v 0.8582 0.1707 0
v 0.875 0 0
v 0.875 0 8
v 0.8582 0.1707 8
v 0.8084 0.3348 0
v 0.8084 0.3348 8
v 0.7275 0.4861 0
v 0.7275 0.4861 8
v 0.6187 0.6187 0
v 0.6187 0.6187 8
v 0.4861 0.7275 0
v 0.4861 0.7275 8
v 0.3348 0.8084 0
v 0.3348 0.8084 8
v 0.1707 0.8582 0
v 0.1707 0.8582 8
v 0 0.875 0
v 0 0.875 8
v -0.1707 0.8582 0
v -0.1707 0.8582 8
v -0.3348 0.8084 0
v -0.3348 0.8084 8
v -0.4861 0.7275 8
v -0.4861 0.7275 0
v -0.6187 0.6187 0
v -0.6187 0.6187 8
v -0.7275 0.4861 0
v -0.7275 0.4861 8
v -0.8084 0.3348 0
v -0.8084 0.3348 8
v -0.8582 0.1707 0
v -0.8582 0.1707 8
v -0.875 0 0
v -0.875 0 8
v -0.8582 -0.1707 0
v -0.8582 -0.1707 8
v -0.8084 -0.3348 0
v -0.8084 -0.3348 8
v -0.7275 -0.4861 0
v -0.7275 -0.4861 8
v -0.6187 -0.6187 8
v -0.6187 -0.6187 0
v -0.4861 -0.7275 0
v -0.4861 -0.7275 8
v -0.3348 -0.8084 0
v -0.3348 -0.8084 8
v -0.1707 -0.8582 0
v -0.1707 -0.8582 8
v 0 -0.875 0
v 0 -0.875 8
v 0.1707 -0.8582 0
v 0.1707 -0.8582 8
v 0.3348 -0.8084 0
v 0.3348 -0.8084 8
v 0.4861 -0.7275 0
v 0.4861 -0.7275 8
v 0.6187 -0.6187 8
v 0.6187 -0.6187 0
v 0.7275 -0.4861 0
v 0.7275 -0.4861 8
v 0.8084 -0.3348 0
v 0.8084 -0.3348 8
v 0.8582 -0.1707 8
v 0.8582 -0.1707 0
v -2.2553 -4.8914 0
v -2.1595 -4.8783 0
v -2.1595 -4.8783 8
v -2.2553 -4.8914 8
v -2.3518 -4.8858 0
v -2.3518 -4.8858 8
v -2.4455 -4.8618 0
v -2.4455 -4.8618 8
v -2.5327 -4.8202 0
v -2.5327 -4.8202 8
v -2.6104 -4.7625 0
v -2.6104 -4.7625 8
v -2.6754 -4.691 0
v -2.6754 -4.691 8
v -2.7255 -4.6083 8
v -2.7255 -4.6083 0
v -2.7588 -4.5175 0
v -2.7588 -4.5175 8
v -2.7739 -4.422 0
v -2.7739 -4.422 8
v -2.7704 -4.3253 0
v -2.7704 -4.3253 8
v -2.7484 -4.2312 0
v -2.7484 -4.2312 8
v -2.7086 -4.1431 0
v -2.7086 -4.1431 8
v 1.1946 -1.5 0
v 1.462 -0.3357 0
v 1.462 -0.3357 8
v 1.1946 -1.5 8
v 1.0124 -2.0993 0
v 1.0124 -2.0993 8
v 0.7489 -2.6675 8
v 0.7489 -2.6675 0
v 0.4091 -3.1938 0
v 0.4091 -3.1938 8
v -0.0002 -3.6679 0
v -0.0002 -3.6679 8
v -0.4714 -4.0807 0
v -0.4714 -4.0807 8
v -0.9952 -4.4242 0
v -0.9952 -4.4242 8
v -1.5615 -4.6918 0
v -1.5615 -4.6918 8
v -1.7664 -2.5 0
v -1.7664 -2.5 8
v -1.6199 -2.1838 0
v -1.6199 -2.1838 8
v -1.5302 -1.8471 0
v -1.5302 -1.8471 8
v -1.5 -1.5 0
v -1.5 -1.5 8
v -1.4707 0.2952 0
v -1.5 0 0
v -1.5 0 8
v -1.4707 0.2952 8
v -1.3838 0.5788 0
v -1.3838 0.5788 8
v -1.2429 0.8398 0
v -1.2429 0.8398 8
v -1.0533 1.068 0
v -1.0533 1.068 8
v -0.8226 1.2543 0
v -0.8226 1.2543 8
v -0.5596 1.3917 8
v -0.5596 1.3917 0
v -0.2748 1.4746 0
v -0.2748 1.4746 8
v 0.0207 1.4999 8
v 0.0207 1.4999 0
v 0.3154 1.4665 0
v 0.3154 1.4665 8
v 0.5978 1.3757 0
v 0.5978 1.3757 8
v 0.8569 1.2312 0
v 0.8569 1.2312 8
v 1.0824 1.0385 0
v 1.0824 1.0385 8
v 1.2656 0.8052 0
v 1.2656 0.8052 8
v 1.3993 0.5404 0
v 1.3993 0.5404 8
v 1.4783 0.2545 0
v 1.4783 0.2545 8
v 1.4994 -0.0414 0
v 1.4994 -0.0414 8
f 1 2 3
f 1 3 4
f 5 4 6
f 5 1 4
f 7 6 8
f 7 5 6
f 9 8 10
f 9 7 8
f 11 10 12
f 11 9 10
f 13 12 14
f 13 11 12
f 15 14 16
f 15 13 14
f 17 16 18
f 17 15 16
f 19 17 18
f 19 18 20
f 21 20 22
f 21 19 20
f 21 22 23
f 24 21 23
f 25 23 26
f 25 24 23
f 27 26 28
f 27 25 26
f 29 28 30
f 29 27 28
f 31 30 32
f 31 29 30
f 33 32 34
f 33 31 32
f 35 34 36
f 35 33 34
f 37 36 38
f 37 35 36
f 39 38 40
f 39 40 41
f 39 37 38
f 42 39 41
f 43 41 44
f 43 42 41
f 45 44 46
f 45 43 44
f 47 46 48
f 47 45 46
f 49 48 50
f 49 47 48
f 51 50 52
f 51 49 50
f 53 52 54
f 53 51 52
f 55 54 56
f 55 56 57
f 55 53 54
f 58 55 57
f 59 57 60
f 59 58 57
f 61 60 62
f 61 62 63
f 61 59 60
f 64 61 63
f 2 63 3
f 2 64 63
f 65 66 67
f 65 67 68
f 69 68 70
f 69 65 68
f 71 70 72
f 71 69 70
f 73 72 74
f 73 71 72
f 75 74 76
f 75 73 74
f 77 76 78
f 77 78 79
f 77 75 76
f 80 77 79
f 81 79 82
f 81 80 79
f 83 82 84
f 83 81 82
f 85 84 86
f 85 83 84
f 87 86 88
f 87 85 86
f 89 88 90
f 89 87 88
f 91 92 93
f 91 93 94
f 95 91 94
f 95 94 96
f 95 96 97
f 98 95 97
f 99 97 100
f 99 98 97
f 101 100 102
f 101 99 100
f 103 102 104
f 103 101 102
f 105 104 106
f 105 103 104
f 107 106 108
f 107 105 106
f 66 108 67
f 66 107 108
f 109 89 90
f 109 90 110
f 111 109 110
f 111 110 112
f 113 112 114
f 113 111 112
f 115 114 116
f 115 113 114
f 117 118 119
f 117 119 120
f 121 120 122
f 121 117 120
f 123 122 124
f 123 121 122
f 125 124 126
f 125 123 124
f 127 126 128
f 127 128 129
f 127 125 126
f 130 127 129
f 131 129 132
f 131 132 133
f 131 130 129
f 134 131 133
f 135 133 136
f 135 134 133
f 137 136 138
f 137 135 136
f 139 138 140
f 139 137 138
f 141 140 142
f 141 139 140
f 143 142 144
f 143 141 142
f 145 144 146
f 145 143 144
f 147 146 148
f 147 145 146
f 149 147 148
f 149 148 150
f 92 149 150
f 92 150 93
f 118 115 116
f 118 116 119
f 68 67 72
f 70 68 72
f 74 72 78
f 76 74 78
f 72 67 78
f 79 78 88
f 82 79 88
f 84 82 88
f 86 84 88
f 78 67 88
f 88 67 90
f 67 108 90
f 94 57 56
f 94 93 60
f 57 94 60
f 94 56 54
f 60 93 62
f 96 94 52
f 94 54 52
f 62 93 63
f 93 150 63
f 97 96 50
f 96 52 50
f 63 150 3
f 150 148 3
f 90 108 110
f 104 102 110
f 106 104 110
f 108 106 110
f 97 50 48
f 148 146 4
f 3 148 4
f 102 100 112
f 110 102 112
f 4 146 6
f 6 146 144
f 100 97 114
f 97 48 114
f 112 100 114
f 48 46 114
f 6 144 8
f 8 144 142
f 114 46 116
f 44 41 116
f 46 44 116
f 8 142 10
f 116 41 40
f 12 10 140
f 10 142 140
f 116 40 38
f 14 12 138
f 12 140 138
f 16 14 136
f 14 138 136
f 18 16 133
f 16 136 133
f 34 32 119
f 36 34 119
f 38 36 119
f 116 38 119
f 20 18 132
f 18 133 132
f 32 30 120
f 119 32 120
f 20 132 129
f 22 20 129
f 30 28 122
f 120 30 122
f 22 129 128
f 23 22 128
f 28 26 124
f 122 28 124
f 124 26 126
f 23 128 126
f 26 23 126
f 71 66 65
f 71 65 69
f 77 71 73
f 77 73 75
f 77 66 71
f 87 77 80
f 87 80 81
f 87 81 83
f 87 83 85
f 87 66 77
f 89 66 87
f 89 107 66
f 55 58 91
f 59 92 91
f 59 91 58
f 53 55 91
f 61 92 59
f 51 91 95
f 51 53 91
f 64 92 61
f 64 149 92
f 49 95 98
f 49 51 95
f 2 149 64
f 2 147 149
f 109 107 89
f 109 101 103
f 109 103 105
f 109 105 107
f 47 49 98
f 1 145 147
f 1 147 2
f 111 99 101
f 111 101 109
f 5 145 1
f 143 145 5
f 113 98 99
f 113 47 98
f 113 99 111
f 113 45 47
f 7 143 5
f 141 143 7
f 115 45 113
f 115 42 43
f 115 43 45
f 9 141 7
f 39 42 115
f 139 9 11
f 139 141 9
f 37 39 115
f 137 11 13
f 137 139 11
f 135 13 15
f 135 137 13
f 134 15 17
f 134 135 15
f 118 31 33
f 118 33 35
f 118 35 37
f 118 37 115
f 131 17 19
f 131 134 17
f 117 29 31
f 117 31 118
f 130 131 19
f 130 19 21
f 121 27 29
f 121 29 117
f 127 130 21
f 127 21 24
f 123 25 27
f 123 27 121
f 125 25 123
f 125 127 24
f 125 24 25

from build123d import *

# Parameters (mm, degrees)
SKETCH1_R           = 0.875
BOSS_EXTRUDE1_DEPTH = 8


with BuildPart() as part:
    # Sketch1 → Boss-Extrude1 (new body)
    with BuildSketch(Plane.XY):
        with BuildLine():
            Line((1.461962708, -0.335656133), (1.194637722, -1.5))
            ThreePointArc((1.194637722, -1.5), (-0.000233431, -3.667871775), (-2.159460582, -4.878294517))
            ThreePointArc((-2.159460582, -4.878294517), (-2.675445647, -4.690989074), (-2.708589557, -4.143060797))
            Line((-2.708589557, -4.143060797), (-1.766378918, -2.5))
            ThreePointArc((-1.766378918, -2.5), (-1.56773594, -2.017435437), (-1.5, -1.5))
            Line((-1.5, -1.5), (-1.5, 0))
            ThreePointArc((-1.5, 0), (0.168902246, 1.490460342), (1.461962708, -0.335656133))
        make_face()
        Circle(SKETCH1_R, mode=Mode.SUBTRACT)
    extrude(amount=BOSS_EXTRUDE1_DEPTH)


solid = part.part
